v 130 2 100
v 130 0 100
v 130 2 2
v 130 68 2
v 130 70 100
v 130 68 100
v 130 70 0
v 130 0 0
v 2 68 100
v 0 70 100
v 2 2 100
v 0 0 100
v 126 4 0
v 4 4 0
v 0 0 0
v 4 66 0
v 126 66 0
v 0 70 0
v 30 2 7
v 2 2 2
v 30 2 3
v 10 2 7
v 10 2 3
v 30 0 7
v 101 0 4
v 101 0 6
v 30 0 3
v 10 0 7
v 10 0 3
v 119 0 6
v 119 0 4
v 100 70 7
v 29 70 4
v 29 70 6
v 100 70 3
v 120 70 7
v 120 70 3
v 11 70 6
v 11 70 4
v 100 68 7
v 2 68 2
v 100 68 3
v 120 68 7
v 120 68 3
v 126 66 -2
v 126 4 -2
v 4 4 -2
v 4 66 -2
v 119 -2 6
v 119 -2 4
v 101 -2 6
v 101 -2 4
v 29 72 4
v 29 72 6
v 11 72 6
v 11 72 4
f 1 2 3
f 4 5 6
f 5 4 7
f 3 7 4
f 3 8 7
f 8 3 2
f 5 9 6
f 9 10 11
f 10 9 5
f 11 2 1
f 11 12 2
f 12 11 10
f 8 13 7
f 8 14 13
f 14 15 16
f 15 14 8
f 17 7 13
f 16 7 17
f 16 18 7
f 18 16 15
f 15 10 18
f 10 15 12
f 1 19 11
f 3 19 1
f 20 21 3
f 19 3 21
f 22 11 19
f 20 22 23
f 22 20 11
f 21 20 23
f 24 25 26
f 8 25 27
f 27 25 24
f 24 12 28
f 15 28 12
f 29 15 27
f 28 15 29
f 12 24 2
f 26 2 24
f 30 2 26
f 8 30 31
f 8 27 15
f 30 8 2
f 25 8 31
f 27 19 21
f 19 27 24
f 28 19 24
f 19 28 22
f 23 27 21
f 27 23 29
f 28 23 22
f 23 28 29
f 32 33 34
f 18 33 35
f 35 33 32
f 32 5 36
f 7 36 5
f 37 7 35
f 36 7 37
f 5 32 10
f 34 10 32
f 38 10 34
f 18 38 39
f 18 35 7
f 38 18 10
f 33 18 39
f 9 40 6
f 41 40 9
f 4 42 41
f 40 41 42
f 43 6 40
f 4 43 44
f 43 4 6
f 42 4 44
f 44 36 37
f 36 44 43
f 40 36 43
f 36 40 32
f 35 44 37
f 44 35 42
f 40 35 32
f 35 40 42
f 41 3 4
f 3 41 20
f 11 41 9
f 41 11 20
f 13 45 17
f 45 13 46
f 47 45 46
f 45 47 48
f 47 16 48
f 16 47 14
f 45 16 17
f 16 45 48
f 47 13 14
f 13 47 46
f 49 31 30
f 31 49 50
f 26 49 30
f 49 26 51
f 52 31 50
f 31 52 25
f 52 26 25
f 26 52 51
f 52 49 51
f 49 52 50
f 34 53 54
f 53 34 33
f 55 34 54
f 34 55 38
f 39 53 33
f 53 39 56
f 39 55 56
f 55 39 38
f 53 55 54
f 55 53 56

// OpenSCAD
THICKNESS = 2;
HEIGHT = 100;
WIDTH = 65 + 5;
DEPTH = 130;
// Locking tab:
TAB_THICKNESS = 2;

// bottom plate
translate([THICKNESS, THICKNESS, 0]) cube([DEPTH-THICKNESS,WIDTH-2*THICKNESS,THICKNESS]);
// stacking plate
translate([THICKNESS+2,THICKNESS+2,-THICKNESS]) cube([DEPTH-2*THICKNESS-4,WIDTH-2*THICKNESS-4,THICKNESS]);

// left wall
difference() {
cube([DEPTH,THICKNESS,HEIGHT]);
translate([10, -1, 2*THICKNESS-1]) cube([20, 2*THICKNESS, TAB_THICKNESS+2]);
}
translate([DEPTH-29,-THICKNESS,2*THICKNESS]) cube([18,THICKNESS,TAB_THICKNESS]);

// right wall
difference() {
translate([0,WIDTH-THICKNESS,0]) cube([DEPTH,THICKNESS,HEIGHT]);
translate([DEPTH-30, WIDTH-THICKNESS-1, 2*THICKNESS-1]) cube([20, 2*THICKNESS, TAB_THICKNESS+2]);
}
// right wall tab
translate([11,WIDTH,2*THICKNESS]) cube([18,THICKNESS,TAB_THICKNESS]);

// back wall
cube([THICKNESS,WIDTH,HEIGHT]);
